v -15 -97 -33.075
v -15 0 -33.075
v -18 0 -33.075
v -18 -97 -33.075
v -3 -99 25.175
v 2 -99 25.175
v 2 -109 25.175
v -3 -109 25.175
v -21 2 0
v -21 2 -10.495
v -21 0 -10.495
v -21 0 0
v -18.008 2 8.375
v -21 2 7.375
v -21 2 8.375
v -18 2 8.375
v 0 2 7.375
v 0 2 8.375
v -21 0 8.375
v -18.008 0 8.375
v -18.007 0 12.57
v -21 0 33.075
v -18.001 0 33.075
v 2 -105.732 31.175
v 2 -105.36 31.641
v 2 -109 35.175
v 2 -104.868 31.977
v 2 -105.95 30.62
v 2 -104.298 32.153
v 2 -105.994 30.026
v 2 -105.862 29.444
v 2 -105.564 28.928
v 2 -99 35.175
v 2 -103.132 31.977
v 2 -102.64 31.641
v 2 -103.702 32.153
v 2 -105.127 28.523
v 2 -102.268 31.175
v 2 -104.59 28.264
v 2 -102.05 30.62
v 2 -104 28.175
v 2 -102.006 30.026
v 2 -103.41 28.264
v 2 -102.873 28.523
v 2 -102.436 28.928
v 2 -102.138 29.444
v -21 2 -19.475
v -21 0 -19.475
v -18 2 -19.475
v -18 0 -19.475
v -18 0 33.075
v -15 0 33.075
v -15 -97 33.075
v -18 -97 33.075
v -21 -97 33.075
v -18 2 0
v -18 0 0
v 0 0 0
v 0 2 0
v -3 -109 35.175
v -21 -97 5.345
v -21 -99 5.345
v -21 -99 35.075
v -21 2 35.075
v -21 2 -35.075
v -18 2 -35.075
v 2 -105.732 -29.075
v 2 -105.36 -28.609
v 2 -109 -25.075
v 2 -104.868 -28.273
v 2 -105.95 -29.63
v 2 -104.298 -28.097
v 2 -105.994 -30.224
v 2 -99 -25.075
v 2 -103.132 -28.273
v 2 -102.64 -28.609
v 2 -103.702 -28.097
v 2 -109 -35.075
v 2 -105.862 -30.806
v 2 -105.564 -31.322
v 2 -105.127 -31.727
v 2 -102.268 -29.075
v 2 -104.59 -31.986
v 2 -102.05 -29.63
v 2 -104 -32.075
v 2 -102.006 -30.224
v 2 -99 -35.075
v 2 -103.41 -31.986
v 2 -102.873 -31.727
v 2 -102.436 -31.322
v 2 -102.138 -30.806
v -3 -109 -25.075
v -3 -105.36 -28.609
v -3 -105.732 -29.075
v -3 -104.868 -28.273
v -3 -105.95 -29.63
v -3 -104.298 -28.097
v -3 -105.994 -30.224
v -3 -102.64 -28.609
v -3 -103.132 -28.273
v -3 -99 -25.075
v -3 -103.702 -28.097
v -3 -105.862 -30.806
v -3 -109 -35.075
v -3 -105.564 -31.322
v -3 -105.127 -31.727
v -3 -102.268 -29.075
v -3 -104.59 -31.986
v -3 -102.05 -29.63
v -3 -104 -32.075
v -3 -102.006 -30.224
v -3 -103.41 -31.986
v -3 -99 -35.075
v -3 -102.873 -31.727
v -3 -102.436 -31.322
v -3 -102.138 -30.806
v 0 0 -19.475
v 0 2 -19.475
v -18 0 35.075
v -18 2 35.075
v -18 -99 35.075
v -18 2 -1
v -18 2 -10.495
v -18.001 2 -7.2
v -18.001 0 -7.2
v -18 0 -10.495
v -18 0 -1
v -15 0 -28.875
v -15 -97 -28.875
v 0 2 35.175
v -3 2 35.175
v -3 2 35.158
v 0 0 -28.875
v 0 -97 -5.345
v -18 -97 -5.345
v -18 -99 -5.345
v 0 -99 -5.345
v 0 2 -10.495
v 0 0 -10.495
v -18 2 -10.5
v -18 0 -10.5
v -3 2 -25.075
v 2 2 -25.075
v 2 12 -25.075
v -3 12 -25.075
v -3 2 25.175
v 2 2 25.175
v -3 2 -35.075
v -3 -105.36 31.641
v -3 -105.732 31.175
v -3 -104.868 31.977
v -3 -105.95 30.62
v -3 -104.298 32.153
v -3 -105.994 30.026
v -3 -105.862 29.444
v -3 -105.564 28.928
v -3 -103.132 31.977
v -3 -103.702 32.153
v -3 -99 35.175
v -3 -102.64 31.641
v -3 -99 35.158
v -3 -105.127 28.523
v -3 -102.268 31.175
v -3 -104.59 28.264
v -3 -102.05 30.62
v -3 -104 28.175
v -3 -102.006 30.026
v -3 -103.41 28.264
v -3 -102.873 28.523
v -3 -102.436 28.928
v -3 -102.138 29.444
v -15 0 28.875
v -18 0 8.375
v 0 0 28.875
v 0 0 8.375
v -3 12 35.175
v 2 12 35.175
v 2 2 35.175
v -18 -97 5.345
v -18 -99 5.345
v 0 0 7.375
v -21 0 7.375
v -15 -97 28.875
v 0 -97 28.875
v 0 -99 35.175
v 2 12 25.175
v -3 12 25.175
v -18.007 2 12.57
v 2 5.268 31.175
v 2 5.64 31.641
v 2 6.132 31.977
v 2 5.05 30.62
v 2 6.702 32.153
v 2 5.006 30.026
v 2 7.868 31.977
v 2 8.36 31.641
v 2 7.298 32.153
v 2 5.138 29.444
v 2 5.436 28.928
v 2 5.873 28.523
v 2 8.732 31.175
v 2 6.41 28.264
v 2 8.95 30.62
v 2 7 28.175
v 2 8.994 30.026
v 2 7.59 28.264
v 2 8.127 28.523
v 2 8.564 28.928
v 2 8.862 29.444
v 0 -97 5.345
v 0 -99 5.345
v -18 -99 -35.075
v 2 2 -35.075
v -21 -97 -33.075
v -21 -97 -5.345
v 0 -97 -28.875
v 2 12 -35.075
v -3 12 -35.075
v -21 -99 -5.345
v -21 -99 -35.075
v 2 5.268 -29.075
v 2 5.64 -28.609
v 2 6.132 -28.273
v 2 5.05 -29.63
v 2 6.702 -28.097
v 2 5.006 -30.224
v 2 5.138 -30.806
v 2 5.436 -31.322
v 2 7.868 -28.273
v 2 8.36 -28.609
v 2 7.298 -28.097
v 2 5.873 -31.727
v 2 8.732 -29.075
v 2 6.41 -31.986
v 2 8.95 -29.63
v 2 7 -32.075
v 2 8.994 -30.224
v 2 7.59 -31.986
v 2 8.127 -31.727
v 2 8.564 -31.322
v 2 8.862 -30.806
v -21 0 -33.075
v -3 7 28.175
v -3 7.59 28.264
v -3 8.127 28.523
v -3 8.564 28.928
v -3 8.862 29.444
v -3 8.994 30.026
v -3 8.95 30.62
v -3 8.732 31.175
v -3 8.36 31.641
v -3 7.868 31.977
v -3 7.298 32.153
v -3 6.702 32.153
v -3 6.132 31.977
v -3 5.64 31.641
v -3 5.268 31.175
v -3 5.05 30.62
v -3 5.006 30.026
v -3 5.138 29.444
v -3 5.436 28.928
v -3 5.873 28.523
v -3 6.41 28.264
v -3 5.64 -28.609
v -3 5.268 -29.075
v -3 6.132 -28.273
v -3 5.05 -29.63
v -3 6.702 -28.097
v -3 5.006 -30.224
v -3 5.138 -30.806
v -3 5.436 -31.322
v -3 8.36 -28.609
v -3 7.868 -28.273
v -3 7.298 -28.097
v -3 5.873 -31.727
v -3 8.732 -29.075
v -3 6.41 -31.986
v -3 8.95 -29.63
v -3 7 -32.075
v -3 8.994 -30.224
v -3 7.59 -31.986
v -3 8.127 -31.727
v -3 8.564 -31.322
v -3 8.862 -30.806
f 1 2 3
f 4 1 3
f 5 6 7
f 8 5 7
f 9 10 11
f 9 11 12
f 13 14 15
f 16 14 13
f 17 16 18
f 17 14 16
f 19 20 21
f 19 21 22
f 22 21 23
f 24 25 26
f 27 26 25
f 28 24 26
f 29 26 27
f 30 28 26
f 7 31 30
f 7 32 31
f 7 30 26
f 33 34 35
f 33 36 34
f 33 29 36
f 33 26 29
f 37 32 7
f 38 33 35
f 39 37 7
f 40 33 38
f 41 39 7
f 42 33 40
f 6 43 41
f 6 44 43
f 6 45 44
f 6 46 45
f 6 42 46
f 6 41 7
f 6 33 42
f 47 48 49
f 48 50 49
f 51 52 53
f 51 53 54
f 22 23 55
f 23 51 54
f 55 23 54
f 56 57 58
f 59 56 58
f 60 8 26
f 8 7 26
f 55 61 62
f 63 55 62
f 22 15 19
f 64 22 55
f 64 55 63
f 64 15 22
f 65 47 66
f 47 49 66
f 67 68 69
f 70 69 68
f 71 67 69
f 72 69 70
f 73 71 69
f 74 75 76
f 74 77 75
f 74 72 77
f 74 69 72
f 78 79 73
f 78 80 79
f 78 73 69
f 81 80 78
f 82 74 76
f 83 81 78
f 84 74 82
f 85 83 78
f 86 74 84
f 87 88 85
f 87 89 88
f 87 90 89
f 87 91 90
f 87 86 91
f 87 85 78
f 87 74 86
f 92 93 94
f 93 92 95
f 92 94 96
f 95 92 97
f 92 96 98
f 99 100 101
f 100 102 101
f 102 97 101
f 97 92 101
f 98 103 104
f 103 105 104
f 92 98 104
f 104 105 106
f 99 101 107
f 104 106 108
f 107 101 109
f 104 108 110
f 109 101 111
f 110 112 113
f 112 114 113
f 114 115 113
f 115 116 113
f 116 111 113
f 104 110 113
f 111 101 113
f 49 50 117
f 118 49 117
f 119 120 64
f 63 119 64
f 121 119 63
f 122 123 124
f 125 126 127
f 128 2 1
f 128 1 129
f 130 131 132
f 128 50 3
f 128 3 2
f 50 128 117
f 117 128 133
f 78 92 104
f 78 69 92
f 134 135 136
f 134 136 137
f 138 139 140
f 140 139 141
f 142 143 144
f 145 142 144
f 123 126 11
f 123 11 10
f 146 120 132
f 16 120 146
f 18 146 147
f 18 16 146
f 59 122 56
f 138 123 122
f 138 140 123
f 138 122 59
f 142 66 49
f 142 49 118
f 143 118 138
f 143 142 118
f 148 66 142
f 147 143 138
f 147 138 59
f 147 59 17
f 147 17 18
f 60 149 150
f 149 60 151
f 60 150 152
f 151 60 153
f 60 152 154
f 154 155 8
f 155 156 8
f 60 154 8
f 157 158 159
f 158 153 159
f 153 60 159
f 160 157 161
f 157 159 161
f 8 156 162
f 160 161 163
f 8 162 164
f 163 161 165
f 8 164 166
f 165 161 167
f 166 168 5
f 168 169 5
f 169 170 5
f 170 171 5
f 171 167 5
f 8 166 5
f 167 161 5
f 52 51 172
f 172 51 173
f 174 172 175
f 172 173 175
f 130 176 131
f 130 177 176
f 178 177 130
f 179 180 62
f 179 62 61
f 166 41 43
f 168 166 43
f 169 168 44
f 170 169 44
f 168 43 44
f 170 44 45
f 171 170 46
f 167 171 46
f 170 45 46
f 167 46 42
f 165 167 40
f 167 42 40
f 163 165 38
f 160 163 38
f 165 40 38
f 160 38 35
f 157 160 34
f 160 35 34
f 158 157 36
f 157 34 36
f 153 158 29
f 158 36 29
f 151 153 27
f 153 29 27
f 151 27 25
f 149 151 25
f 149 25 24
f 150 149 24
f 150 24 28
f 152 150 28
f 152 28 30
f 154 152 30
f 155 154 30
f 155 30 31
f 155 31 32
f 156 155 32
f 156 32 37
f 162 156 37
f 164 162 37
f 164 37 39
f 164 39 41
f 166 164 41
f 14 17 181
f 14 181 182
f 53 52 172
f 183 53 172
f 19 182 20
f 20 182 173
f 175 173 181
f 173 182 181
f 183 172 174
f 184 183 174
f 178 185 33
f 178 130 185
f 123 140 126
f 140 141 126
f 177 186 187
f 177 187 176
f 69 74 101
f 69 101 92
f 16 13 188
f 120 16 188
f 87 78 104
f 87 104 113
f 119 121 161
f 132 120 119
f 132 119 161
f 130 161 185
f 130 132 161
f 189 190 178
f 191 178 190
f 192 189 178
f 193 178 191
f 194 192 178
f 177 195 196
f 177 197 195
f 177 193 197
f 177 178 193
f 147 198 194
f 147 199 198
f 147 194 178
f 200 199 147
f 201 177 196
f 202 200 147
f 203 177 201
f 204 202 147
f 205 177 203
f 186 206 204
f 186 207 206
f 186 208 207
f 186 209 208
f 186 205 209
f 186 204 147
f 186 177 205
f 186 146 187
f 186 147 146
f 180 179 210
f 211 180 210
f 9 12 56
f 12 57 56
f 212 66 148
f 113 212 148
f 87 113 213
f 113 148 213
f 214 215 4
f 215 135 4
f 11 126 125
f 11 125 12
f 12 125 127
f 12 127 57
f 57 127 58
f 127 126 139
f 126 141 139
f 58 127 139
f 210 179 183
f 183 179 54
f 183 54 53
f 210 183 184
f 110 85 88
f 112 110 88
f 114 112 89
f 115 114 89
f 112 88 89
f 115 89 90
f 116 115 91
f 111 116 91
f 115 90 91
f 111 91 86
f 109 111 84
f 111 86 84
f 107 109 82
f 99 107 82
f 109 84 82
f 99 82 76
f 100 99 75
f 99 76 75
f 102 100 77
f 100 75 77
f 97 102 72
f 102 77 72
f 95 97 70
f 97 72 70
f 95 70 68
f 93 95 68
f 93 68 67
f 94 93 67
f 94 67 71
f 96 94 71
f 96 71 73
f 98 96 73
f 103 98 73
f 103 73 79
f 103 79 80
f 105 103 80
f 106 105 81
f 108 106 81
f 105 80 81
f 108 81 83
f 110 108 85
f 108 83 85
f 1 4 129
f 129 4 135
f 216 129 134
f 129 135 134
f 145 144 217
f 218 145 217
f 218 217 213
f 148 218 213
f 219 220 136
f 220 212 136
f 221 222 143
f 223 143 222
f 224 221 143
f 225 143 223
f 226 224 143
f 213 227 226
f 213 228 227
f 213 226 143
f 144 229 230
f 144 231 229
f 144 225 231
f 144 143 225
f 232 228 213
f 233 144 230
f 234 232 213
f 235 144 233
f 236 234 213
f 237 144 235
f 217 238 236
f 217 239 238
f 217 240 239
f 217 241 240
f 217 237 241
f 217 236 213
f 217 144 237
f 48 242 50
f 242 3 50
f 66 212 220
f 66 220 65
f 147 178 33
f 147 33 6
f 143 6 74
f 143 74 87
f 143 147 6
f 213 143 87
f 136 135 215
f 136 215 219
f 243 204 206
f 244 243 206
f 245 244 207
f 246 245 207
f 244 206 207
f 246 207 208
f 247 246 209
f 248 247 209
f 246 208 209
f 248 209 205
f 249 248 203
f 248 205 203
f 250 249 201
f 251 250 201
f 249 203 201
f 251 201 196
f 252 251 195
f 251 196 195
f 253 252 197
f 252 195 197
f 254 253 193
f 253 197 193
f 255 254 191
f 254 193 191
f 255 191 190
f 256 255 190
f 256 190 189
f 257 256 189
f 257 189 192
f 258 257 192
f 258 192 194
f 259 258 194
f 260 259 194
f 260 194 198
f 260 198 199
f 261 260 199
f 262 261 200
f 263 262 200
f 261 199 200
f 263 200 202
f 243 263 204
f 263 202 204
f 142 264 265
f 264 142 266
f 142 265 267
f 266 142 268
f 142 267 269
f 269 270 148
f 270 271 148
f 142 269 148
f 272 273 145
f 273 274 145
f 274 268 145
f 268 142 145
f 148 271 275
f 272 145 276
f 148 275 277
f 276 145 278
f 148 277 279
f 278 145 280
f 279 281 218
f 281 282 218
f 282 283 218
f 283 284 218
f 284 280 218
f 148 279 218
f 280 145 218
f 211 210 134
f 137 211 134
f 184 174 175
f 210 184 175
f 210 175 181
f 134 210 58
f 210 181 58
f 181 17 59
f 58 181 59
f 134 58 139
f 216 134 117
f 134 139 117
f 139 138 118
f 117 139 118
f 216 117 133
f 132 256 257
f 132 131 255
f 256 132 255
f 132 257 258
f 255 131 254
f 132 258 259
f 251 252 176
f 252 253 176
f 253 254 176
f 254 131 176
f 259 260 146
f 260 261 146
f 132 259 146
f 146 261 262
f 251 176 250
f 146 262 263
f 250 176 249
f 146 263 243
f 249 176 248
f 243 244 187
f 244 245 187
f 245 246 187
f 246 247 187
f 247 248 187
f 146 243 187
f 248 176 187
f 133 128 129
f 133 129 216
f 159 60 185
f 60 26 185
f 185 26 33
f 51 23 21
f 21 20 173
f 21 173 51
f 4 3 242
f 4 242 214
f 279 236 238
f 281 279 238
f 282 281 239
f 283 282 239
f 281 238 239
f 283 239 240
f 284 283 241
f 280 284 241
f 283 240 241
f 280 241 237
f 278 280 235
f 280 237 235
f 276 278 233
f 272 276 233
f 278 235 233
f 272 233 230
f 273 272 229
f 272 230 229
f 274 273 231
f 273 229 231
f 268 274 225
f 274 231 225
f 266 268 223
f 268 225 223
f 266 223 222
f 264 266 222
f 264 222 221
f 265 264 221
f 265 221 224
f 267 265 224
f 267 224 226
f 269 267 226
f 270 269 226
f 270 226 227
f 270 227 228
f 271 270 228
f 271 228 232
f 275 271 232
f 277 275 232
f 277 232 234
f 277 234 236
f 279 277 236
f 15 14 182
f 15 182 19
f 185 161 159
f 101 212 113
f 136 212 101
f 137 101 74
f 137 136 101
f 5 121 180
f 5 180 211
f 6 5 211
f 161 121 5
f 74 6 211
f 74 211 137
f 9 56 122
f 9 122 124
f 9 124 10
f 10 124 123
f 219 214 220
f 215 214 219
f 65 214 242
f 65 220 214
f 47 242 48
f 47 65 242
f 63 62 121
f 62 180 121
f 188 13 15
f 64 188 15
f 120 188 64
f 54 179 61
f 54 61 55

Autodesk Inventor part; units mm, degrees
ref_plane "YZ Plane" through (0, 0, 0) normal (1, 0, 0) x (0, 1, 0)
ref_plane "XZ Plane" through (0, 0, 0) normal (0, 1, 0) x (-1, 0, 0)
ref_plane "XY Plane" through (0, 0, 0) normal (0, 0, 1) x (1, 0, 0)
sketch "Sketch1" plane through (0, 0, 0) normal (0, 1, 0) x (-1, 0, 0)
  line L0 (15, 35.0917) -> (15, 35.175)
  line L1 (-2, 35.175) -> (-2, -33.075)
  line L2 (-2, -33.075) -> (-2, -35.075)
  line L3 (15, 33.075) -> (15, 28.875)
  line L4 (15, 28.875) -> (0, 28.875)
  line L5 (15, 33.075) -> (18, 33.075)
  line L6 (18, 33.075) -> (18, 35.075)
  line L7 (18, 35.075) -> (0, 35.175)
  line L8 (15, -33.075) -> (15, -28.875)
  line L9 (15, -28.875) -> (0, -28.875)
  line L10 (15, -33.075) -> (18, -33.075)
  line L11 (18, -33.075) -> (18, -35.075)
  line L12 (18, -35.075) -> (0, -35.075)
  line L13 (0, 35.175) -> (-2, 35.175)
  line L14 (0, -35.075) -> (-2, -35.075)
  line L15 (0, 28.875) -> (0, -28.875)
  point P0 (0, 0)
  point P1 (15, 39.275)
  point P2 (-2, -37.275)
  point P3 (-2, -39.275)
  point P4 (18, -39.275)
  point P5 (18, -37.275)
extrude "Extrusion1" add sketch "Sketch1" against normal blind 97
sketch "Sketch2" plane through (0, 0, 0) normal (0, 1, 0) x (1, 0, 0)
  line L0 (2, 39.275) -> (-18, 39.275) projected
  line L1 (2, -35.175) -> (2, 35.075) projected
  line L2 (-18, 39.275) -> (-18, 37.275) projected
  line L3 (-18, 35.075) -> (-18, 25.675)
  line L4 (0, -28.875) -> (0, 28.875) projected
  line L5 (0, 25.675) -> (0, 17.695)
  line L6 (-18.0003, 10.5) -> (-18.0012, 7.2)
  line L7 (-18, -35.075) -> (-18.0067, -12.57)
  line L8 (-18, -33.075) -> (-18, -35.075) projected
  line L9 (-18, -35.075) -> (0, -35.175) projected
  line L10 (2, 35.075) -> (-18, 35.075) projected
  line L11 (-18, 35.075) -> (-18, 33.075) projected
  line L12 (-18, -35.075) -> (-18, -33.075) projected
  line L13 (-18, -35.075) -> (-18, -10.375)
  line L14 (-18, 33.075) -> (-18, 19.475)
  line L15 (-18, 19.475) -> (0, 19.475)
  line L16 (0, 19.475) -> (0, 11.495)
  line L17 (-18, 10.5) -> (-18, 1)
  line L18 (-18, -33.075) -> (-18.0079, -8.375)
  line L19 (-18.0079, -8.375) -> (0, -8.375)
  line L20 (0, 11.495) -> (0, 10.495)
  line L21 (0, 10.495) -> (-18, 10.5)
  line L22 (-18, 1) -> (-18, 0)
  line L23 (-18, 0) -> (0, 0)
  line L24 (0, -35.175) -> (-18, -35.075) projected
  line L25 (-18, -33.075) -> (-15, -33.075) projected
  line L26 (-18, -35.075) -> (0, -35.175) projected
  line L27 (0, -35.175) -> (2, -35.175) projected
  line L28 (2, -35.175) -> (2, 35.075) projected
  line L29 (2, 35.075) -> (-18, 35.075) projected
  line L30 (-18, 35.075) -> (-18, 33.075) projected
  line L31 (-18, 33.075) -> (-15, 33.075) projected
  line L32 (-15, 33.075) -> (-15, 28.875) projected
  line L33 (-15, 28.875) -> (0, 28.875) projected
  line L34 (0, 28.875) -> (0, -28.875) projected
  line L35 (0, -28.875) -> (-15, -28.875) projected
  line L36 (-15, -28.875) -> (-15, -33.075) projected
  line L37 (-15, -33.075) -> (-18, -33.075) projected
  line L38 (-18, -33.075) -> (-18, -35.075) projected
  line L39 (2, -35.175) -> (2, 35.075) projected
  line L40 (2, 35.075) -> (2, -35.175) projected
  line L41 (-15, -33.075) -> (-18, -33.075) projected
  line L42 (-15, -28.875) -> (-15, -33.075) projected
  line L43 (0, -28.875) -> (-15, -28.875) projected
  line L44 (0, 28.875) -> (0, -28.875) projected
  line L45 (0, 28.875) -> (0, -28.875) projected
  line L46 (0, -28.875) -> (0, 28.875) projected
  line L47 (2, 35.075) -> (-18, 35.075) projected
  line L48 (-18, 35.075) -> (2, 35.075) projected
  line L49 (-15, 28.875) -> (0, 28.875) projected
  line L50 (-15, 28.875) -> (0, 28.875) projected
  line L51 (0, 28.875) -> (-15, 28.875) projected
  line L52 (-15, 33.075) -> (-15, 28.875) projected
  line L53 (-15, 33.075) -> (-15, 28.875) projected
  line L54 (-15, 28.875) -> (-15, 33.075) projected
  line L55 (-18, 35.075) -> (-18, 33.075) projected
  line L56 (-18, 33.075) -> (-18, 35.075) projected
  line L57 (-18, 33.075) -> (-15, 33.075) projected
  line L58 (-15, 33.075) -> (-18, 33.075) projected
  line L59 (-18, 33.075) -> (-15, 33.075) projected
  line L60 (-15, 33.075) -> (-18, 33.075) projected
  line L61 (-18, 33.075) -> (-18, 35.075) projected
  line L62 (0, 28.875) -> (-15, 28.875) projected
  line L63 (-15, -28.875) -> (0, -28.875) projected
  line L64 (-15, -33.075) -> (-15, -28.875) projected
  line L65 (2, 35.075) -> (2, -35.175) projected
  line L66 (0, -35.175) -> (-18, -35.075) projected
  line L67 (-18, -35.075) -> (-18, -33.075) projected
  line L68 (-18, -33.075) -> (-15, -33.075) projected
  line L69 (-15, -33.075) -> (-15, -28.875) projected
  line L70 (-15, -28.875) -> (0, -28.875) projected
  line L71 (0, -28.875) -> (0, 28.875) projected
  line L72 (0, 28.875) -> (-15, 28.875) projected
  line L73 (-15, 28.875) -> (-15, 33.075) projected
  line L74 (-15, 33.075) -> (-18, 33.075) projected
  line L75 (-18, 33.075) -> (-18, 35.075) projected
  line L76 (-18, 35.075) -> (2, 35.075) projected
  line L77 (2, 35.075) -> (2, -35.175) projected
  line L78 (2, -35.175) -> (0, -35.175) projected
  line L79 (-18, 35.075) -> (2, 35.075) projected
  line L80 (-15, 28.875) -> (-15, 33.075) projected
  line L81 (0, -28.875) -> (-15, -28.875) projected
  line L82 (-15, -28.875) -> (0, -28.875) projected
  line L83 (-15, -28.875) -> (-15, -33.075) projected
  line L84 (-15, -33.075) -> (-15, -28.875) projected
  line L85 (2, -35.175) -> (0, -35.175) projected
  line L86 (0, -35.175) -> (2, -35.175) projected
  line L87 (0, -35.175) -> (2, -35.175) projected
  line L88 (2, -35.175) -> (0, -35.175) projected
  line L89 (-18, -35.075) -> (0, -35.175) projected
  line L90 (0, -35.175) -> (-18, -35.075) projected
  line L91 (-15, -33.075) -> (-18, -33.075) projected
  line L92 (-18, -33.075) -> (-15, -33.075) projected
  line L93 (-18, -33.075) -> (-18, -35.075) projected
  line L94 (-18, -35.075) -> (-18, -33.075) projected
  point P0 (0, 33.075)
  point P1 (-18.0067, -12.57)
  dimension "d20" = 13.6
  dimension "d23" = 24.7
sketch "Sketch3" plane through (0, -97, 0) normal (0, -1, 0) x (1, 0, 0)
  line L0 (-18, -35.075) -> (2, -35.075) projected
  line L1 (-18, -33.075) -> (-18, -35.075) projected
  line L2 (0, 35.175) -> (-18, 35.075) projected
  line L3 (-18, 35.075) -> (-18, 33.075) projected
  line L4 (-18, -33.075) -> (-18, -5.345)
  line L5 (-18, -5.345) -> (0, -5.345)
  line L6 (-15, 33.075) -> (-18, 33.075) projected
  line L7 (0, 28.875) -> (0, -28.875) projected
  line L8 (-15, 33.075) -> (-15, 28.875) projected
  line L9 (-15, -28.875) -> (-15, -33.075) projected
  line L10 (0, -28.875) -> (-15, -28.875) projected
  line L11 (-15, 28.875) -> (0, 28.875) projected
  line L12 (-18, 33.075) -> (-15, 33.075) projected
  line L13 (-15, -33.075) -> (-18, -33.075) projected
  line L14 (0, 35.175) -> (-18, 35.075) projected
  line L15 (-18, 35.075) -> (-18, 33.075) projected
  line L16 (-18, 33.075) -> (-15, 33.075) projected
  line L17 (-15, 33.075) -> (-15, 28.875) projected
  line L18 (-15, 28.875) -> (0, 28.875) projected
  line L19 (0, 28.875) -> (0, -28.875) projected
  line L20 (0, -28.875) -> (-15, -28.875) projected
  line L21 (-15, -28.875) -> (-15, -33.075) projected
  line L22 (-15, -33.075) -> (-18, -33.075) projected
  line L23 (-18, -33.075) -> (-18, -35.075) projected
  line L24 (-18, -35.075) -> (2, -35.075) projected
  line L25 (2, -35.075) -> (2, 35.175) projected
  line L26 (2, 35.175) -> (0, 35.175) projected
  line L27 (2, 35.175) -> (2, -35.075) projected
  line L28 (2, -35.075) -> (2, 35.175) projected
  line L29 (-18, 35.075) -> (0, 35.175) projected
  line L30 (-18, 33.075) -> (-18, 35.075) projected
  line L31 (2, -35.075) -> (-18, -35.075) projected
  line L32 (-18, -35.075) -> (2, -35.075) projected
  line L33 (-18, -35.075) -> (-18, -33.075) projected
  line L34 (-18, -33.075) -> (-18, -35.075) projected
  line L35 (-15, -33.075) -> (-15, -28.875) projected
  line L36 (-15, -28.875) -> (-15, -33.075) projected
  line L37 (-18, -33.075) -> (-15, -33.075) projected
  line L38 (-15, -33.075) -> (-18, -33.075) projected
  line L39 (-15, -28.875) -> (0, -28.875) projected
  line L40 (0, -28.875) -> (-15, -28.875) projected
  line L41 (0, -28.875) -> (0, 28.875) projected
  line L42 (0, 28.875) -> (0, -28.875) projected
  line L43 (2, -35.075) -> (2, 35.175) projected
  line L44 (2, 35.175) -> (2, -35.075) projected
  line L45 (-18, 35.075) -> (0, 35.175) projected
  line L46 (0, 35.175) -> (2, 35.175) projected
  line L47 (2, 35.175) -> (2, -35.075) projected
  line L48 (2, -35.075) -> (-18, -35.075) projected
  line L49 (-18, -35.075) -> (-18, -33.075) projected
  line L50 (-18, -33.075) -> (-15, -33.075) projected
  line L51 (-15, -33.075) -> (-15, -28.875) projected
  line L52 (-15, -28.875) -> (0, -28.875) projected
  line L53 (0, -28.875) -> (0, 28.875) projected
  line L54 (0, 28.875) -> (-15, 28.875) projected
  line L55 (-15, 28.875) -> (-15, 33.075) projected
  line L56 (-15, 33.075) -> (-18, 33.075) projected
  line L57 (-18, 33.075) -> (-18, 35.075) projected
  line L58 (-15, 28.875) -> (-15, 33.075) projected
  line L59 (0, 28.875) -> (-15, 28.875) projected
  line L60 (0, -28.875) -> (0, 28.875) projected
  line L61 (2, -35.075) -> (-18, -35.075) projected
  line L62 (-15, -28.875) -> (0, -28.875) projected
  line L63 (-15, -33.075) -> (-15, -28.875) projected
  line L64 (-18, -33.075) -> (-15, -33.075) projected
  line L65 (-18, -35.075) -> (-18, -33.075) projected
  line L66 (0, 28.875) -> (-15, 28.875) projected
  line L67 (-15, 28.875) -> (0, 28.875) projected
  line L68 (-15, 28.875) -> (-15, 33.075) projected
  line L69 (-15, 33.075) -> (-15, 28.875) projected
  line L70 (-15, 33.075) -> (-18, 33.075) projected
  line L71 (-18, 33.075) -> (-15, 33.075) projected
  line L72 (-18, 33.075) -> (-18, 35.075) projected
  line L73 (-18, 35.075) -> (-18, 33.075) projected
  line L74 (2, 35.175) -> (0, 35.175) projected
  line L75 (0, 35.175) -> (2, 35.175) projected
  line L76 (0, 35.175) -> (2, 35.175) projected
  line L77 (2, 35.175) -> (0, 35.175) projected
  line L78 (-18, 35.075) -> (0, 35.175) projected
  line L79 (0, 35.175) -> (-18, 35.075) projected
  line L80 (-18, 33.075) -> (-18, 5.345)
  line L81 (-18, 5.345) -> (0, 5.345)
  point P0 (0, 0)
  dimension "d26" = 27.73
  dimension "d33" = 27.73
  dimension "d34" = 90
extrude "Extrusion2" add sketch "Sketch2" along normal blind 2
extrude "Extrusion3" add sketch "Sketch3" along normal blind 2 contours L1 L13 L9 L10 L7 L11 L8 L6 L3 L2 L26 L25 L0 | L4 L5 L7 L10 L9 L13
extrude "Extrusion4" add sketch "Sketch3" along normal up to surface (2 mm away) contours L81 L80 L6 L8 L11 L7
sketch "Sketch5" plane through (-18, 0, -33.075) normal (-1, 0, 0) x (0, 0, 1)
  line L0 (66.15, 2) -> (68.15, 2) projected
  line L1 (68.15, 2) -> (68.25, 2) projected
  line L2 (68.15, 2) -> (68.15, -99) projected
  line L3 (68.25, -99) -> (68.25, 2) projected
  line L4 (68.25, -99) -> (68.25, 2) projected
  line L5 (66.15, 0) -> (66.15, 2) projected
  line L6 (68.25, 2) -> (-2, 2) projected
  line L7 (68.25, -99) -> (68.25, 2) projected
  line L8 (-2, -99) -> (68.25, -99) projected
  line L9 (-2, -99) -> (-2, 2) projected
  line L10 (68.25, 2) -> (-2, 2) projected
  line L11 (38.42, -99) -> (38.42, -97) projected
  line L12 (38.42, -97) -> (61.95, -97) projected
  line L13 (61.95, 0) -> (61.95, -97) projected
  line L14 (41.45, 0) -> (61.95, 0) projected
  line L15 (41.45, 0) -> (41.45, 2) projected
  line L16 (33.075, 2) -> (41.45, 2) projected
  line L17 (33.075, 0) -> (33.075, 2) projected
  line L18 (22.58, 0) -> (33.075, 0) projected
  line L19 (22.58, 0) -> (22.58, 2) projected
  line L20 (13.6, 2) -> (22.58, 2) projected
  line L21 (13.6, 0) -> (13.6, 2) projected
  line L22 (4.2, 0) -> (13.6, 0) projected
  line L23 (4.2, 0) -> (4.2, -97) projected
  line L24 (27.73, -97) -> (4.2, -97) projected
  line L25 (27.73, -97) -> (27.73, -99) projected
  line L26 (38.42, -99) -> (27.73, -99) projected
  line L27 (27.73, -97) -> (27.73, -99) projected
  line L28 (27.73, -97) -> (27.73, -99) projected
  line L29 (27.73, -97) -> (27.73, -99) projected
  line L30 (13.6, 0) -> (13.6, 2) projected
  line L31 (4.2, 0) -> (4.2, -97) projected
  line L32 (4.2, 0) -> (4.2, -97) projected
  line L33 (4.2, 0) -> (4.2, -97) projected
  line L34 (4.2, 0) -> (4.2, -97) projected
  line L35 (27.73, -99) -> (-2, -99) projected
  line L36 (-2, -99) -> (-2, 2) projected
  line L37 (27.73, -99) -> (-2, -99) projected
  line L38 (27.73, -97) -> (27.73, -99) projected
  line L39 (27.73, -97) -> (0, -97) projected
  line L40 (0, 0) -> (0, -97) projected
  line L41 (0, 0) -> (13.6, 0) projected
  line L42 (13.6, 0) -> (13.6, 2) projected
  line L43 (-2, 2) -> (13.6, 2) projected
  line L44 (-2, -99) -> (-2, 2) projected
  line L45 (-2, -99) -> (-2, 2) projected
  line L46 (-2, -99) -> (-2, 2) projected
  line L47 (-2, -99) -> (-2, 2) projected
  line L48 (-2, 2) -> (13.6, 2) projected
  line L49 (0, 0) -> (13.6, 0) projected
  line L50 (0, 0) -> (4.2, 0) projected
  line L51 (0, 0) -> (4.2, 0) projected
  line L52 (0, 0) -> (0, -97) projected
  line L53 (4.2, -97) -> (0, -97) projected
  line L54 (4.2, 0) -> (4.2, -97) projected
  line L55 (0, 0) -> (0, -97) projected
  line L56 (0, 0) -> (0, -97) projected
  line L57 (0, 0) -> (0, -97) projected
  line L58 (0, 0) -> (0, -97) projected
  line L59 (-2, -99) -> (68.25, -99) projected
  line L60 (38.42, -97) -> (61.95, -97) projected
  line L61 (27.73, -97) -> (27.73, -99) projected
  line L62 (38.42, -97) -> (38.42, -99) projected
  line L63 (38.42, -99) -> (38.42, -97) projected
  line L64 (38.42, -97) -> (38.42, -99) projected
  line L65 (38.42, -99) -> (38.42, -97) projected
  line L66 (4.2, -97) -> (0, -97) projected
  line L67 (27.73, -97) -> (0, -97) projected
  line L68 (27.73, -97) -> (4.2, -97) projected
  line L69 (27.73, -97) -> (0, -97) projected
  line L70 (27.73, -97) -> (4.2, -97) projected
  line L71 (4.2, -97) -> (0, -97) projected
  line L72 (61.95, 0) -> (61.95, -97) projected
  line L73 (61.95, 0) -> (61.95, -97) projected
  line L74 (61.95, 0) -> (61.95, -97) projected
  line L75 (61.95, 0) -> (61.95, -97) projected
  line L76 (61.95, -97) -> (66.15, -97) projected
  line L77 (66.15, -97) -> (38.42, -97) projected
  line L78 (61.95, 0) -> (66.15, 0) projected
  line L79 (61.95, -97) -> (66.15, -97) projected
  line L80 (66.15, 0) -> (66.15, -97) projected
  line L81 (61.95, 0) -> (66.15, 0) projected
  line L82 (61.95, 0) -> (61.95, -97) projected
  line L83 (66.15, 0) -> (66.15, -97) projected
  line L84 (66.15, 0) -> (66.15, -97) projected
  line L85 (66.15, 0) -> (66.15, -97) projected
  line L86 (66.15, -97) -> (38.42, -97) projected
  line L87 (61.95, -97) -> (66.15, -97) projected
  line L88 (38.42, -97) -> (61.95, -97) projected
  line L89 (68.15, -99) -> (38.42, -99) projected
  line L90 (66.15, 0) -> (66.15, -97) projected
  line L91 (66.15, -97) -> (38.42, -97) projected
  line L92 (38.42, -97) -> (38.42, -99) projected
  line L93 (68.15, -99) -> (38.42, -99) projected
  line L94 (68.15, 2) -> (68.15, -99) projected
  line L95 (66.15, 2) -> (68.15, 2) projected
  line L96 (66.15, 0) -> (66.15, 2) projected
  line L97 (68.25, -99) -> (68.15, -99) projected
  line L98 (68.15, 2) -> (68.15, -99) projected
  line L99 (68.25, -99) -> (68.15, -99) projected
  line L100 (68.25, -99) -> (68.25, 2) projected
  line L101 (68.15, 2) -> (68.25, 2) projected
  line L102 (68.25, -99) -> (68.25, 2) projected
  line L103 (68.25, -99) -> (68.25, 2) projected
  line L104 (66.15, 0) -> (66.15, -97) projected
  line L105 (13.6, 2) -> (22.58, 2) projected
  line L106 (4.2, 0) -> (13.6, 0) projected
  line L107 (13.6, 0) -> (13.6, 2) projected
  line L108 (41.45, 0) -> (61.95, 0) projected
  line L109 (33.075, 2) -> (41.45, 2) projected
  line L110 (22.58, 0) -> (33.075, 0) projected
  line L111 (22.58, 0) -> (22.58, 2) projected
  line L112 (41.45, 0) -> (41.45, 2) projected
  line L113 (33.075, 0) -> (33.075, 2) projected
  line L114 (38.42, -99) -> (27.73, -99) projected
  line L115 (27.73, -99) -> (-2, -99) projected
  line L116 (-2, -99) -> (68.25, -99) projected
  line L117 (68.25, -99) -> (68.15, -99) projected
  line L118 (68.15, -99) -> (38.42, -99) projected
  line L119 (38.42, -99) -> (27.73, -99) projected
  line L120 (22.58, 2) -> (22.575, 2) projected
  line L121 (22.575, 0) -> (22.575, 2) projected
  line L122 (22.575, 2) -> (33.075, 2) projected
  line L123 (33.075, 0) -> (33.075, 2) projected
  line L124 (41.45, 0) -> (41.45, 2) projected
  line L125 (41.45, 2) -> (66.15, 2) projected
  line L126 (41.45, 0) -> (66.15, 0) projected
  line L127 (22.58, 0) -> (22.575, 0) projected
  line L128 (22.575, 0) -> (33.075, 0) projected
  line L129 (41.45, 0) -> (66.15, 0) projected
  line L130 (41.45, 0) -> (61.95, 0) projected
  line L131 (61.95, 0) -> (66.15, 0) projected
  line L132 (41.45, 0) -> (41.45, 2) projected
  line L133 (41.45, 0) -> (41.45, 2) projected
  line L134 (41.45, 0) -> (66.15, 0) projected
  line L135 (66.15, 0) -> (66.15, 2) projected
  line L136 (41.45, 2) -> (66.15, 2) projected
  line L137 (41.45, 0) -> (41.45, 2) projected
  line L138 (22.58, 2) -> (22.575, 2) projected
  line L139 (22.575, 2) -> (33.075, 2) projected
  line L140 (33.075, 2) -> (41.45, 2) projected
  line L141 (41.45, 2) -> (66.15, 2) projected
  line L142 (66.15, 2) -> (68.15, 2) projected
  line L143 (68.15, 2) -> (68.25, 2) projected
  line L144 (68.25, 2) -> (-2, 2) projected
  line L145 (-2, 2) -> (13.6, 2) projected
  line L146 (13.6, 2) -> (22.58, 2) projected
  line L147 (22.58, 0) -> (33.075, 0) projected
  line L148 (22.575, 0) -> (33.075, 0) projected
  line L149 (22.58, 0) -> (22.575, 0) projected
  line L150 (22.58, 0) -> (22.575, 0) projected
  line L151 (22.575, 0) -> (22.575, 2) projected
  line L152 (22.58, 2) -> (22.575, 2) projected
  line L153 (22.58, 0) -> (22.58, 2) projected
  line L154 (22.575, 0) -> (33.075, 0) projected
  line L155 (33.075, 0) -> (33.075, 2) projected
  line L156 (22.575, 2) -> (33.075, 2) projected
  line L157 (22.575, 0) -> (22.575, 2) projected
  line L158 (13.6, 0) -> (13.6, 2) projected
  line L159 (13.6, 0) -> (13.6, 2) projected
  line L160 (0, 0) -> (4.2, 0) projected
  line L161 (4.2, 0) -> (13.6, 0) projected
  line L162 (0, 0) -> (13.6, 0) projected
  line L163 (33.075, 0) -> (33.075, 2) projected
  line L164 (33.075, 0) -> (33.075, 2) projected
  line L165 (66.15, -97) -> (61.95, -97) projected
  line L166 (61.95, -97) -> (4.2, -97) projected
  line L167 (4.2, -97) -> (61.95, -97) projected
  line L168 (4.2, -97) -> (61.95, -97) projected
  line L169 (61.95, -97) -> (4.2, -97) projected
  line L170 (4.2, -97) -> (61.95, -97) projected
  line L171 (61.95, -97) -> (4.2, -97) projected
  line L172 (66.15, -97) -> (38.42, -97) projected
  line L173 (68.25, -97) -> (68.15, -97) projected
  line L174 (68.15, -97) -> (68.25, -97) projected
  line L175 (68.15, -97) -> (68.25, -97) projected
  line L176 (68.25, -97) -> (68.15, -97) projected
  line L177 (68.15, -97) -> (66.15, -97) projected
  line L178 (68.15, -97) -> (66.15, -97) projected
  line L179 (66.15, -97) -> (68.15, -97) projected
  line L180 (4.2, -97) -> (0, -97) projected
  line L181 (0, -97) -> (27.73, -97) projected
  line L182 (-2, -97) -> (68.25, -97) projected
  line L183 (68.25, -97) -> (-2, -97) projected
  line L184 (-2, -97) -> (68.25, -97) projected
  line L185 (68.25, -97) -> (-2, -97) projected
  line L186 (-2, -97) -> (68.25, -97) projected
  line L187 (68.25, -97) -> (-2, -97) projected
  line L188 (0, -97) -> (-2, -97) projected
  line L189 (0, -97) -> (-2, -97) projected
  line L190 (-2, -97) -> (0, -97) projected
  line L191 (0, -97) -> (-2, -97) projected
  line L192 (4.2, -97) -> (0, -97) projected
  line L193 (0, -97) -> (4.2, -97) projected
  line L194 (4.2, -97) -> (0, -97) projected
  line L195 (66.15, -97) -> (61.95, -97) projected
  line L196 (61.95, -97) -> (66.15, -97) projected
  line L197 (61.95, -97) -> (66.15, -97) projected
  line L198 (-2, -97) -> (0, -97) projected
  line L199 (0, -97) -> (4.2, -97) projected
  line L200 (0, -97) -> (4.2, -97) projected
  line L201 (-2, -97) -> (0, -97) projected
  line L202 (66.15, -97) -> (68.15, -97) projected
  line L203 (68.15, -97) -> (68.25, -97) projected
  line L204 (68.25, -97) -> (68.15, -97) projected
  line L205 (61.95, -97) -> (66.15, -97) projected
  line L206 (66.15, -97) -> (61.95, -97) projected
  line L207 (66.15, -97) -> (68.15, -97) projected
  line L208 (68.15, -97) -> (66.15, -97) projected
  point P0 (33.075, -97)
  point P1 (-2, 2)
extrude "Extrusion5" add sketch "Sketch5" along normal blind 3 contours L0 L2 L177 L80 L5 | L5 L78 L14 L15 L6 | L2 L8 L11 L12 L76 L177 | L17 L18 L19 L6 | L8 L9 L182 L39 L24 L25 | L21 L22 L41 L40 L182 L9 L6
sketch "Sketch6" plane through (0, 2, 0) normal (0, 1, 0) x (1, 0, 0)
  line L0 (0, 0) -> (0, -8.375) projected
  line L1 (0, -8.375) -> (-21, -8.375) projected
  line L2 (0, -8.375) -> (0, -7.375)
  line L3 (0, -7.375) -> (-21, -7.375)
  line L4 (-21, -7.375) -> (-21, -8.375)
  dimension "d39" = 1
extrude "Extrusion6" add sketch "Sketch6" against normal up to surface (2 mm away)
sketch "스케치7" plane through (2, 2, 35.175) normal (1, 0, 0) x (0, 0, -1)
  line L0 (0, -101) -> (0, 0) projected
  line L1 (70.25, -101) -> (0, -101) projected
  line L2 (70.25, -101) -> (70.25, 0) projected
  line L3 (0, 0) -> (70.25, 0) projected
  line L4 (70.25, -101) -> (60.25, -101)
  line L5 (60.25, -101) -> (60.25, -111)
  line L6 (60.25, -111) -> (70.25, -111)
  line L7 (70.25, -111) -> (70.25, -101)
  line L8 (70.25, -50.5) -> (0, -50.5) construction
  line L9 (35.125, 0) -> (35.125, -101) construction
  line L10 (60.25, 0) -> (60.25, 10)
  line L11 (60.25, 10) -> (70.25, 10)
  line L12 (70.25, 10) -> (70.25, 0)
  line L13 (10, -101) -> (10, -111)
  line L14 (10, -111) -> (0, -111)
  line L15 (0, -111) -> (0, -101)
  line L16 (10, 0) -> (10, 10)
  line L17 (10, 10) -> (0, 10)
  line L18 (0, 10) -> (0, 0)
  circle A0 centre (65.25, -106) radius 2
  circle A1 centre (65.25, 5) radius 2
  circle A2 centre (5, -106) radius 2
  circle A3 centre (5, 5) radius 2
  point P0 (35.175, -2)
  point P1 (10, 0)
  dimension "d42" = 10
  dimension "d43" = 10
  dimension "d44" = 4
  dimension "d45" = 111
  dimension "d46" = 60.25
extrude "돌출7" add sketch "스케치7" against normal blind 5 contours L1 L13 L14 L15 | L18 L17 L16 L3 | L1 L7 L6 L5 | L10 L11 L12 L3
properties part number "stm32" material "고무, 검은색"
